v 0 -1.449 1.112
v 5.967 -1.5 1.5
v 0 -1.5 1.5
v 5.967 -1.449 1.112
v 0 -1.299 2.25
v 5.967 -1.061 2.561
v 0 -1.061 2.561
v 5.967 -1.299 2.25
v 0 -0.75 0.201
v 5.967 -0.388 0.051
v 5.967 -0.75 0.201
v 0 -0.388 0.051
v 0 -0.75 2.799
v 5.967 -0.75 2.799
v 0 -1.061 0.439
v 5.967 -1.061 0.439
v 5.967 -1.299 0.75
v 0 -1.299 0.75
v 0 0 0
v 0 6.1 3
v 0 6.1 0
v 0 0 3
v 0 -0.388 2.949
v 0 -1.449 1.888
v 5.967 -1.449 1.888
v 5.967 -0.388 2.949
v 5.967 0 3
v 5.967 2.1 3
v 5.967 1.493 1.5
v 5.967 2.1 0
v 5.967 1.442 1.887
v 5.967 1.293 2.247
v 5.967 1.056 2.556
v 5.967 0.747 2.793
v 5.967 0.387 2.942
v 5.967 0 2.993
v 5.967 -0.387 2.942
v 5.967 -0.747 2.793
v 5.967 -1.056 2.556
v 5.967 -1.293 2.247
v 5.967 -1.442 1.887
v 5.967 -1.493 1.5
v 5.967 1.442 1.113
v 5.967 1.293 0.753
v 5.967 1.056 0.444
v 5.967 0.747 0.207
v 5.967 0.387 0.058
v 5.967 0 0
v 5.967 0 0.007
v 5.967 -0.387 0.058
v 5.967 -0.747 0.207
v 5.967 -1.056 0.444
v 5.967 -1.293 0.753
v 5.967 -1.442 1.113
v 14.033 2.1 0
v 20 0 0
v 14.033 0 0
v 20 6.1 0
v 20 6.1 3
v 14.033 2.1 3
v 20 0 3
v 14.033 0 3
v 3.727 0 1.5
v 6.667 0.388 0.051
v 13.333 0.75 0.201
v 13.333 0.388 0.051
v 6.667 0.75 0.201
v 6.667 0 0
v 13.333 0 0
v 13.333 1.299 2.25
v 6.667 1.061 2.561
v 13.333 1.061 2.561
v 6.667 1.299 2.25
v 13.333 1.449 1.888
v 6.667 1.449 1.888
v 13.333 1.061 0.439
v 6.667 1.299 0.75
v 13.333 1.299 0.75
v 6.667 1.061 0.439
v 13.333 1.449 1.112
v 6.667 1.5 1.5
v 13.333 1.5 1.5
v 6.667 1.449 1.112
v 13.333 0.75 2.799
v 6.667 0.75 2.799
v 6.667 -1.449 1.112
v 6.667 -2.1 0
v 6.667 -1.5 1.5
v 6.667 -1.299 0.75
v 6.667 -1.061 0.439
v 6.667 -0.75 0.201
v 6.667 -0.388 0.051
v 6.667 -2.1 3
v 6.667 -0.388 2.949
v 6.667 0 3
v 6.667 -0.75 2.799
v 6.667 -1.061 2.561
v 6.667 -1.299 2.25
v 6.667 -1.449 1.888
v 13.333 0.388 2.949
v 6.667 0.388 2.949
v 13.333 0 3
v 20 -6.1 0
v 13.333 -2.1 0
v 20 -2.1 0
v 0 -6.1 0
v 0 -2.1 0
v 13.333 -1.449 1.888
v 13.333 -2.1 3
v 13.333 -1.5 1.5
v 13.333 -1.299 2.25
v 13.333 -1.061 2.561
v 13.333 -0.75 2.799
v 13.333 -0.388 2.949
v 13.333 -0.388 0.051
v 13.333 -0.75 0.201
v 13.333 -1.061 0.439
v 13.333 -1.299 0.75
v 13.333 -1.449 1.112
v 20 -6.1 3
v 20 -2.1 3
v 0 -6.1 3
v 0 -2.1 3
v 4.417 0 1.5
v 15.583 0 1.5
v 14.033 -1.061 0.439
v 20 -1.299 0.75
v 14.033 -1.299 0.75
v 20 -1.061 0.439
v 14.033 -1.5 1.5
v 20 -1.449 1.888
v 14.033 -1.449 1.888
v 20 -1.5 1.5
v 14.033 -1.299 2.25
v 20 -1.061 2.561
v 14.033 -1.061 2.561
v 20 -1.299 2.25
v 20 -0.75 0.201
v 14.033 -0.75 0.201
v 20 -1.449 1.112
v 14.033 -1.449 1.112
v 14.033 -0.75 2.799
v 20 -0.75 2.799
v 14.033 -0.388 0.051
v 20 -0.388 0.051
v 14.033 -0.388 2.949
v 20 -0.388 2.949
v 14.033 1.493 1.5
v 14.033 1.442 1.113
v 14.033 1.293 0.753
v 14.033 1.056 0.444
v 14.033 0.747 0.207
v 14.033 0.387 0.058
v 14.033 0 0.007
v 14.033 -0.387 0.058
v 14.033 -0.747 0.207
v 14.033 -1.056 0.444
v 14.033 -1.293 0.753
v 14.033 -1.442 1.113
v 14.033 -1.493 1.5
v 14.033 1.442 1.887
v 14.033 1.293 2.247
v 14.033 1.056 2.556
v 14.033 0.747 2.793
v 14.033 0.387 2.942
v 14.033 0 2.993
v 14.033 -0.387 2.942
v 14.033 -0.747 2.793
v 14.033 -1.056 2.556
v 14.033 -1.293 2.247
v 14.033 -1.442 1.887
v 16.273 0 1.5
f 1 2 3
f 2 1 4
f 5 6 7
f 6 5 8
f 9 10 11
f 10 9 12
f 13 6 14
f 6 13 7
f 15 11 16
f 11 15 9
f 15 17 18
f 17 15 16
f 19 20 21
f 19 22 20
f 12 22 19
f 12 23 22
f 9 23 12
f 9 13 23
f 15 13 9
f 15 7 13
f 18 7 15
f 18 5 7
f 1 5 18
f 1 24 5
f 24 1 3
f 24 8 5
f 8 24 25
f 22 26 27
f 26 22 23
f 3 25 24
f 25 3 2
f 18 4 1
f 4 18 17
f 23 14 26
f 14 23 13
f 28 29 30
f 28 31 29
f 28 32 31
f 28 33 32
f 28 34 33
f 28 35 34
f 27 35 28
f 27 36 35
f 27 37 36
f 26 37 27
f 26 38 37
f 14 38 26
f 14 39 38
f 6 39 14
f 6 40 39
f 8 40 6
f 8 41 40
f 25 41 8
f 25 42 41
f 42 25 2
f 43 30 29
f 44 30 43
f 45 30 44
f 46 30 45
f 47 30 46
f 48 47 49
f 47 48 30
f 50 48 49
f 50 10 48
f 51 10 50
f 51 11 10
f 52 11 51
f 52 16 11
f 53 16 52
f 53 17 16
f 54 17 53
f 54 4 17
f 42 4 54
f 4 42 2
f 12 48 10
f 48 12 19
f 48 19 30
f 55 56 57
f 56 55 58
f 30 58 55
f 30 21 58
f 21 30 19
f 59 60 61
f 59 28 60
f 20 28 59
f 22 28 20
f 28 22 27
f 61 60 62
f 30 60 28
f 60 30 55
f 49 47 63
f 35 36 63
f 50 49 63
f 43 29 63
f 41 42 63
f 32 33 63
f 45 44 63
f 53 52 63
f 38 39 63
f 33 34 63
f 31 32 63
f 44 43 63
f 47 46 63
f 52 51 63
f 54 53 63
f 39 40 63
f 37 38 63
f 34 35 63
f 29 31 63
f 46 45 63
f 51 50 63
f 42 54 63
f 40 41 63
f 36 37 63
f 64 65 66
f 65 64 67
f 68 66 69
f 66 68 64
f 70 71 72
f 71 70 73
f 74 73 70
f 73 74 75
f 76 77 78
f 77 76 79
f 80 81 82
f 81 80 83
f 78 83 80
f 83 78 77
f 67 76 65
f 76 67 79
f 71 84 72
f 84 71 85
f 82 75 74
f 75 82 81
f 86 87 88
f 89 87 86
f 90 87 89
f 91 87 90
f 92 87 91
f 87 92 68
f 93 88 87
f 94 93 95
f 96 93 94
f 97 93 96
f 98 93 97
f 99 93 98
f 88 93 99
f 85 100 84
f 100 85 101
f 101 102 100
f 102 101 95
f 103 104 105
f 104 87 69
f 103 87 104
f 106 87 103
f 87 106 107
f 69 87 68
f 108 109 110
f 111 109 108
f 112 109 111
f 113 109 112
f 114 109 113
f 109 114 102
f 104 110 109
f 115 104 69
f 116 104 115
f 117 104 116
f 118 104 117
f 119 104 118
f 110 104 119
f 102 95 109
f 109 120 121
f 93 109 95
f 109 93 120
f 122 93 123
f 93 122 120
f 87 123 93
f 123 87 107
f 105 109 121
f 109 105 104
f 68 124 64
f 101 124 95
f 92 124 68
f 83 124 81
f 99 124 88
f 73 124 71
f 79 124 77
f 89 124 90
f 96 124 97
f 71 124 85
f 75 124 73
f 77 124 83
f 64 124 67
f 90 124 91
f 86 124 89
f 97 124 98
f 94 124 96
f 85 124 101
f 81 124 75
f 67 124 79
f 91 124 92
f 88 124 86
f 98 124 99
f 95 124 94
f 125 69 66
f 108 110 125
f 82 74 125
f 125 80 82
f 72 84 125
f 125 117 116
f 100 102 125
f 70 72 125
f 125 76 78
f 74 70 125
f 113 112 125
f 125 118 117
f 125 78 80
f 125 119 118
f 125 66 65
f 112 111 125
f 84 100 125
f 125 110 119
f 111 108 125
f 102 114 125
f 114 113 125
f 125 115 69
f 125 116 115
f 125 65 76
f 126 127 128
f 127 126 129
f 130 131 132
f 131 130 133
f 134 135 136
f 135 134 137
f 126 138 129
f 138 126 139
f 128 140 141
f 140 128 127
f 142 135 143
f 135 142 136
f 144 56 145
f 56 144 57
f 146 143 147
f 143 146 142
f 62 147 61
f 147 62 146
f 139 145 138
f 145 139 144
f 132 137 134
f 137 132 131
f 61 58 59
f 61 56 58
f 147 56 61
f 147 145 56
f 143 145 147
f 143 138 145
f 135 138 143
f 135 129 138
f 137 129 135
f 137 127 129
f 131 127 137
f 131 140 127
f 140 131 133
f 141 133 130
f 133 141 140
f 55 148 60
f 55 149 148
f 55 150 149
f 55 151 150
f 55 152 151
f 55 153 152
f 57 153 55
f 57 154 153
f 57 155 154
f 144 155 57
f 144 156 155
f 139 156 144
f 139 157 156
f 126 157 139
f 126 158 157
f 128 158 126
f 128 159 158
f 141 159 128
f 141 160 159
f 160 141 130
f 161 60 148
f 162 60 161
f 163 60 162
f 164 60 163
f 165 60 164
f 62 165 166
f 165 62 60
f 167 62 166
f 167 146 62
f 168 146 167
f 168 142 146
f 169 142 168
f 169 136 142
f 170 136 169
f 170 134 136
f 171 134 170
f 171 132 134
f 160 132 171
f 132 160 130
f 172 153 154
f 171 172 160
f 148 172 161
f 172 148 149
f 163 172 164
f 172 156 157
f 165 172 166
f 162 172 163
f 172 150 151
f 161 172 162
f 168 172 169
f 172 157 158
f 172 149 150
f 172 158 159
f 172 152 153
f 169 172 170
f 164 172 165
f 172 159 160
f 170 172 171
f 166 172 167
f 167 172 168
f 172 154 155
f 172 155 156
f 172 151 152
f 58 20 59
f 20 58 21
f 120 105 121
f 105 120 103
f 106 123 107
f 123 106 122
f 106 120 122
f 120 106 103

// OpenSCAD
module math_hinge(){// mathgrrl cone hinge

//////////////////////////////////////////////////////
// parameters

// Length of the complete hinge
length = 20;

// Height (diameter) of the hinge
height = 3;

// Clearance between cones and holes
clearance = .7;		

// Clearance between hinge and sides
gap = .6; 				

// Parameters that the user does not get to specify
$fn=24*1;
border = 2*1; 
fudge = .01*1;			// to preserve mesh integrity
corner = 0*1;      	// space between hinge and corner
hinge_radius = height/2;
cone_height = 1.5*hinge_radius;  

//////////////////////////////////////////////////////
// renders

rotate(90,[0,1,0]) 
	translate([-hinge_radius,0,0])
		hinge();

translate([0,hinge_radius+gap,0]) bar();
translate([0,-2*border-hinge_radius-gap,0]) bar();

//translate([0,hinge_radius+gap,0]) square();
//translate([0,-length-hinge_radius-gap,0]) square();


//////////////////////////////////////////////////////
// module for hinge

module hinge(){
	rad = hinge_radius;
	clr = clearance;
	len = (length-2*corner)/3; 
	con = cone_height;
	// left outside hinge = (cylinder+box)-cone
	difference(){
		union(){
			translate([0,0,corner]) cylinder(h=len-clr,r=rad);
			translate([-rad,0,corner]) cube([2*rad,rad+gap,len-clr]);
		}
		translate([0,0,corner+len-con-clr+fudge]) cylinder(h=con,r1=0,r2=rad);
	}
	// inside hinge = cylinder+box+cone+cone
	union(){
		translate([0,0,corner+len]) cylinder(h=len,r=rad);
		translate([-rad,-rad-gap,corner+len]) cube([2*rad,rad+gap,len]);
		translate([0,0,corner+len-con]) cylinder(h=con,r1=0,r2=rad);
		translate([0,0,corner+2*len]) cylinder(h=con,r1=rad,r2=0);
	}
	// right outside hinge = (cylinder+box)-cone
	difference(){
		union(){
			translate([0,0,corner+2*len+clr]) cylinder(h=len-clr,r=rad);
			translate([-rad,0,corner+2*len+clr]) cube([2*rad,rad+gap,len-clr]);
		}
		translate([0,0,corner+2*len+clr-fudge]) cylinder(h=con,r1=rad,r2=0);	
	}
}

//////////////////////////////////////////////////////
// module for square shape

module square(){
	difference(){
		cube([length,length,height]);
		translate([border,border,-fudge])
			cube(	[length-2*border,length-2*border,height+2*fudge]);
	}
}

//////////////////////////////////////////////////////
// module for bar shape

module bar(){
	cube([length,2*border,height]);
}
}
math_hinge();
